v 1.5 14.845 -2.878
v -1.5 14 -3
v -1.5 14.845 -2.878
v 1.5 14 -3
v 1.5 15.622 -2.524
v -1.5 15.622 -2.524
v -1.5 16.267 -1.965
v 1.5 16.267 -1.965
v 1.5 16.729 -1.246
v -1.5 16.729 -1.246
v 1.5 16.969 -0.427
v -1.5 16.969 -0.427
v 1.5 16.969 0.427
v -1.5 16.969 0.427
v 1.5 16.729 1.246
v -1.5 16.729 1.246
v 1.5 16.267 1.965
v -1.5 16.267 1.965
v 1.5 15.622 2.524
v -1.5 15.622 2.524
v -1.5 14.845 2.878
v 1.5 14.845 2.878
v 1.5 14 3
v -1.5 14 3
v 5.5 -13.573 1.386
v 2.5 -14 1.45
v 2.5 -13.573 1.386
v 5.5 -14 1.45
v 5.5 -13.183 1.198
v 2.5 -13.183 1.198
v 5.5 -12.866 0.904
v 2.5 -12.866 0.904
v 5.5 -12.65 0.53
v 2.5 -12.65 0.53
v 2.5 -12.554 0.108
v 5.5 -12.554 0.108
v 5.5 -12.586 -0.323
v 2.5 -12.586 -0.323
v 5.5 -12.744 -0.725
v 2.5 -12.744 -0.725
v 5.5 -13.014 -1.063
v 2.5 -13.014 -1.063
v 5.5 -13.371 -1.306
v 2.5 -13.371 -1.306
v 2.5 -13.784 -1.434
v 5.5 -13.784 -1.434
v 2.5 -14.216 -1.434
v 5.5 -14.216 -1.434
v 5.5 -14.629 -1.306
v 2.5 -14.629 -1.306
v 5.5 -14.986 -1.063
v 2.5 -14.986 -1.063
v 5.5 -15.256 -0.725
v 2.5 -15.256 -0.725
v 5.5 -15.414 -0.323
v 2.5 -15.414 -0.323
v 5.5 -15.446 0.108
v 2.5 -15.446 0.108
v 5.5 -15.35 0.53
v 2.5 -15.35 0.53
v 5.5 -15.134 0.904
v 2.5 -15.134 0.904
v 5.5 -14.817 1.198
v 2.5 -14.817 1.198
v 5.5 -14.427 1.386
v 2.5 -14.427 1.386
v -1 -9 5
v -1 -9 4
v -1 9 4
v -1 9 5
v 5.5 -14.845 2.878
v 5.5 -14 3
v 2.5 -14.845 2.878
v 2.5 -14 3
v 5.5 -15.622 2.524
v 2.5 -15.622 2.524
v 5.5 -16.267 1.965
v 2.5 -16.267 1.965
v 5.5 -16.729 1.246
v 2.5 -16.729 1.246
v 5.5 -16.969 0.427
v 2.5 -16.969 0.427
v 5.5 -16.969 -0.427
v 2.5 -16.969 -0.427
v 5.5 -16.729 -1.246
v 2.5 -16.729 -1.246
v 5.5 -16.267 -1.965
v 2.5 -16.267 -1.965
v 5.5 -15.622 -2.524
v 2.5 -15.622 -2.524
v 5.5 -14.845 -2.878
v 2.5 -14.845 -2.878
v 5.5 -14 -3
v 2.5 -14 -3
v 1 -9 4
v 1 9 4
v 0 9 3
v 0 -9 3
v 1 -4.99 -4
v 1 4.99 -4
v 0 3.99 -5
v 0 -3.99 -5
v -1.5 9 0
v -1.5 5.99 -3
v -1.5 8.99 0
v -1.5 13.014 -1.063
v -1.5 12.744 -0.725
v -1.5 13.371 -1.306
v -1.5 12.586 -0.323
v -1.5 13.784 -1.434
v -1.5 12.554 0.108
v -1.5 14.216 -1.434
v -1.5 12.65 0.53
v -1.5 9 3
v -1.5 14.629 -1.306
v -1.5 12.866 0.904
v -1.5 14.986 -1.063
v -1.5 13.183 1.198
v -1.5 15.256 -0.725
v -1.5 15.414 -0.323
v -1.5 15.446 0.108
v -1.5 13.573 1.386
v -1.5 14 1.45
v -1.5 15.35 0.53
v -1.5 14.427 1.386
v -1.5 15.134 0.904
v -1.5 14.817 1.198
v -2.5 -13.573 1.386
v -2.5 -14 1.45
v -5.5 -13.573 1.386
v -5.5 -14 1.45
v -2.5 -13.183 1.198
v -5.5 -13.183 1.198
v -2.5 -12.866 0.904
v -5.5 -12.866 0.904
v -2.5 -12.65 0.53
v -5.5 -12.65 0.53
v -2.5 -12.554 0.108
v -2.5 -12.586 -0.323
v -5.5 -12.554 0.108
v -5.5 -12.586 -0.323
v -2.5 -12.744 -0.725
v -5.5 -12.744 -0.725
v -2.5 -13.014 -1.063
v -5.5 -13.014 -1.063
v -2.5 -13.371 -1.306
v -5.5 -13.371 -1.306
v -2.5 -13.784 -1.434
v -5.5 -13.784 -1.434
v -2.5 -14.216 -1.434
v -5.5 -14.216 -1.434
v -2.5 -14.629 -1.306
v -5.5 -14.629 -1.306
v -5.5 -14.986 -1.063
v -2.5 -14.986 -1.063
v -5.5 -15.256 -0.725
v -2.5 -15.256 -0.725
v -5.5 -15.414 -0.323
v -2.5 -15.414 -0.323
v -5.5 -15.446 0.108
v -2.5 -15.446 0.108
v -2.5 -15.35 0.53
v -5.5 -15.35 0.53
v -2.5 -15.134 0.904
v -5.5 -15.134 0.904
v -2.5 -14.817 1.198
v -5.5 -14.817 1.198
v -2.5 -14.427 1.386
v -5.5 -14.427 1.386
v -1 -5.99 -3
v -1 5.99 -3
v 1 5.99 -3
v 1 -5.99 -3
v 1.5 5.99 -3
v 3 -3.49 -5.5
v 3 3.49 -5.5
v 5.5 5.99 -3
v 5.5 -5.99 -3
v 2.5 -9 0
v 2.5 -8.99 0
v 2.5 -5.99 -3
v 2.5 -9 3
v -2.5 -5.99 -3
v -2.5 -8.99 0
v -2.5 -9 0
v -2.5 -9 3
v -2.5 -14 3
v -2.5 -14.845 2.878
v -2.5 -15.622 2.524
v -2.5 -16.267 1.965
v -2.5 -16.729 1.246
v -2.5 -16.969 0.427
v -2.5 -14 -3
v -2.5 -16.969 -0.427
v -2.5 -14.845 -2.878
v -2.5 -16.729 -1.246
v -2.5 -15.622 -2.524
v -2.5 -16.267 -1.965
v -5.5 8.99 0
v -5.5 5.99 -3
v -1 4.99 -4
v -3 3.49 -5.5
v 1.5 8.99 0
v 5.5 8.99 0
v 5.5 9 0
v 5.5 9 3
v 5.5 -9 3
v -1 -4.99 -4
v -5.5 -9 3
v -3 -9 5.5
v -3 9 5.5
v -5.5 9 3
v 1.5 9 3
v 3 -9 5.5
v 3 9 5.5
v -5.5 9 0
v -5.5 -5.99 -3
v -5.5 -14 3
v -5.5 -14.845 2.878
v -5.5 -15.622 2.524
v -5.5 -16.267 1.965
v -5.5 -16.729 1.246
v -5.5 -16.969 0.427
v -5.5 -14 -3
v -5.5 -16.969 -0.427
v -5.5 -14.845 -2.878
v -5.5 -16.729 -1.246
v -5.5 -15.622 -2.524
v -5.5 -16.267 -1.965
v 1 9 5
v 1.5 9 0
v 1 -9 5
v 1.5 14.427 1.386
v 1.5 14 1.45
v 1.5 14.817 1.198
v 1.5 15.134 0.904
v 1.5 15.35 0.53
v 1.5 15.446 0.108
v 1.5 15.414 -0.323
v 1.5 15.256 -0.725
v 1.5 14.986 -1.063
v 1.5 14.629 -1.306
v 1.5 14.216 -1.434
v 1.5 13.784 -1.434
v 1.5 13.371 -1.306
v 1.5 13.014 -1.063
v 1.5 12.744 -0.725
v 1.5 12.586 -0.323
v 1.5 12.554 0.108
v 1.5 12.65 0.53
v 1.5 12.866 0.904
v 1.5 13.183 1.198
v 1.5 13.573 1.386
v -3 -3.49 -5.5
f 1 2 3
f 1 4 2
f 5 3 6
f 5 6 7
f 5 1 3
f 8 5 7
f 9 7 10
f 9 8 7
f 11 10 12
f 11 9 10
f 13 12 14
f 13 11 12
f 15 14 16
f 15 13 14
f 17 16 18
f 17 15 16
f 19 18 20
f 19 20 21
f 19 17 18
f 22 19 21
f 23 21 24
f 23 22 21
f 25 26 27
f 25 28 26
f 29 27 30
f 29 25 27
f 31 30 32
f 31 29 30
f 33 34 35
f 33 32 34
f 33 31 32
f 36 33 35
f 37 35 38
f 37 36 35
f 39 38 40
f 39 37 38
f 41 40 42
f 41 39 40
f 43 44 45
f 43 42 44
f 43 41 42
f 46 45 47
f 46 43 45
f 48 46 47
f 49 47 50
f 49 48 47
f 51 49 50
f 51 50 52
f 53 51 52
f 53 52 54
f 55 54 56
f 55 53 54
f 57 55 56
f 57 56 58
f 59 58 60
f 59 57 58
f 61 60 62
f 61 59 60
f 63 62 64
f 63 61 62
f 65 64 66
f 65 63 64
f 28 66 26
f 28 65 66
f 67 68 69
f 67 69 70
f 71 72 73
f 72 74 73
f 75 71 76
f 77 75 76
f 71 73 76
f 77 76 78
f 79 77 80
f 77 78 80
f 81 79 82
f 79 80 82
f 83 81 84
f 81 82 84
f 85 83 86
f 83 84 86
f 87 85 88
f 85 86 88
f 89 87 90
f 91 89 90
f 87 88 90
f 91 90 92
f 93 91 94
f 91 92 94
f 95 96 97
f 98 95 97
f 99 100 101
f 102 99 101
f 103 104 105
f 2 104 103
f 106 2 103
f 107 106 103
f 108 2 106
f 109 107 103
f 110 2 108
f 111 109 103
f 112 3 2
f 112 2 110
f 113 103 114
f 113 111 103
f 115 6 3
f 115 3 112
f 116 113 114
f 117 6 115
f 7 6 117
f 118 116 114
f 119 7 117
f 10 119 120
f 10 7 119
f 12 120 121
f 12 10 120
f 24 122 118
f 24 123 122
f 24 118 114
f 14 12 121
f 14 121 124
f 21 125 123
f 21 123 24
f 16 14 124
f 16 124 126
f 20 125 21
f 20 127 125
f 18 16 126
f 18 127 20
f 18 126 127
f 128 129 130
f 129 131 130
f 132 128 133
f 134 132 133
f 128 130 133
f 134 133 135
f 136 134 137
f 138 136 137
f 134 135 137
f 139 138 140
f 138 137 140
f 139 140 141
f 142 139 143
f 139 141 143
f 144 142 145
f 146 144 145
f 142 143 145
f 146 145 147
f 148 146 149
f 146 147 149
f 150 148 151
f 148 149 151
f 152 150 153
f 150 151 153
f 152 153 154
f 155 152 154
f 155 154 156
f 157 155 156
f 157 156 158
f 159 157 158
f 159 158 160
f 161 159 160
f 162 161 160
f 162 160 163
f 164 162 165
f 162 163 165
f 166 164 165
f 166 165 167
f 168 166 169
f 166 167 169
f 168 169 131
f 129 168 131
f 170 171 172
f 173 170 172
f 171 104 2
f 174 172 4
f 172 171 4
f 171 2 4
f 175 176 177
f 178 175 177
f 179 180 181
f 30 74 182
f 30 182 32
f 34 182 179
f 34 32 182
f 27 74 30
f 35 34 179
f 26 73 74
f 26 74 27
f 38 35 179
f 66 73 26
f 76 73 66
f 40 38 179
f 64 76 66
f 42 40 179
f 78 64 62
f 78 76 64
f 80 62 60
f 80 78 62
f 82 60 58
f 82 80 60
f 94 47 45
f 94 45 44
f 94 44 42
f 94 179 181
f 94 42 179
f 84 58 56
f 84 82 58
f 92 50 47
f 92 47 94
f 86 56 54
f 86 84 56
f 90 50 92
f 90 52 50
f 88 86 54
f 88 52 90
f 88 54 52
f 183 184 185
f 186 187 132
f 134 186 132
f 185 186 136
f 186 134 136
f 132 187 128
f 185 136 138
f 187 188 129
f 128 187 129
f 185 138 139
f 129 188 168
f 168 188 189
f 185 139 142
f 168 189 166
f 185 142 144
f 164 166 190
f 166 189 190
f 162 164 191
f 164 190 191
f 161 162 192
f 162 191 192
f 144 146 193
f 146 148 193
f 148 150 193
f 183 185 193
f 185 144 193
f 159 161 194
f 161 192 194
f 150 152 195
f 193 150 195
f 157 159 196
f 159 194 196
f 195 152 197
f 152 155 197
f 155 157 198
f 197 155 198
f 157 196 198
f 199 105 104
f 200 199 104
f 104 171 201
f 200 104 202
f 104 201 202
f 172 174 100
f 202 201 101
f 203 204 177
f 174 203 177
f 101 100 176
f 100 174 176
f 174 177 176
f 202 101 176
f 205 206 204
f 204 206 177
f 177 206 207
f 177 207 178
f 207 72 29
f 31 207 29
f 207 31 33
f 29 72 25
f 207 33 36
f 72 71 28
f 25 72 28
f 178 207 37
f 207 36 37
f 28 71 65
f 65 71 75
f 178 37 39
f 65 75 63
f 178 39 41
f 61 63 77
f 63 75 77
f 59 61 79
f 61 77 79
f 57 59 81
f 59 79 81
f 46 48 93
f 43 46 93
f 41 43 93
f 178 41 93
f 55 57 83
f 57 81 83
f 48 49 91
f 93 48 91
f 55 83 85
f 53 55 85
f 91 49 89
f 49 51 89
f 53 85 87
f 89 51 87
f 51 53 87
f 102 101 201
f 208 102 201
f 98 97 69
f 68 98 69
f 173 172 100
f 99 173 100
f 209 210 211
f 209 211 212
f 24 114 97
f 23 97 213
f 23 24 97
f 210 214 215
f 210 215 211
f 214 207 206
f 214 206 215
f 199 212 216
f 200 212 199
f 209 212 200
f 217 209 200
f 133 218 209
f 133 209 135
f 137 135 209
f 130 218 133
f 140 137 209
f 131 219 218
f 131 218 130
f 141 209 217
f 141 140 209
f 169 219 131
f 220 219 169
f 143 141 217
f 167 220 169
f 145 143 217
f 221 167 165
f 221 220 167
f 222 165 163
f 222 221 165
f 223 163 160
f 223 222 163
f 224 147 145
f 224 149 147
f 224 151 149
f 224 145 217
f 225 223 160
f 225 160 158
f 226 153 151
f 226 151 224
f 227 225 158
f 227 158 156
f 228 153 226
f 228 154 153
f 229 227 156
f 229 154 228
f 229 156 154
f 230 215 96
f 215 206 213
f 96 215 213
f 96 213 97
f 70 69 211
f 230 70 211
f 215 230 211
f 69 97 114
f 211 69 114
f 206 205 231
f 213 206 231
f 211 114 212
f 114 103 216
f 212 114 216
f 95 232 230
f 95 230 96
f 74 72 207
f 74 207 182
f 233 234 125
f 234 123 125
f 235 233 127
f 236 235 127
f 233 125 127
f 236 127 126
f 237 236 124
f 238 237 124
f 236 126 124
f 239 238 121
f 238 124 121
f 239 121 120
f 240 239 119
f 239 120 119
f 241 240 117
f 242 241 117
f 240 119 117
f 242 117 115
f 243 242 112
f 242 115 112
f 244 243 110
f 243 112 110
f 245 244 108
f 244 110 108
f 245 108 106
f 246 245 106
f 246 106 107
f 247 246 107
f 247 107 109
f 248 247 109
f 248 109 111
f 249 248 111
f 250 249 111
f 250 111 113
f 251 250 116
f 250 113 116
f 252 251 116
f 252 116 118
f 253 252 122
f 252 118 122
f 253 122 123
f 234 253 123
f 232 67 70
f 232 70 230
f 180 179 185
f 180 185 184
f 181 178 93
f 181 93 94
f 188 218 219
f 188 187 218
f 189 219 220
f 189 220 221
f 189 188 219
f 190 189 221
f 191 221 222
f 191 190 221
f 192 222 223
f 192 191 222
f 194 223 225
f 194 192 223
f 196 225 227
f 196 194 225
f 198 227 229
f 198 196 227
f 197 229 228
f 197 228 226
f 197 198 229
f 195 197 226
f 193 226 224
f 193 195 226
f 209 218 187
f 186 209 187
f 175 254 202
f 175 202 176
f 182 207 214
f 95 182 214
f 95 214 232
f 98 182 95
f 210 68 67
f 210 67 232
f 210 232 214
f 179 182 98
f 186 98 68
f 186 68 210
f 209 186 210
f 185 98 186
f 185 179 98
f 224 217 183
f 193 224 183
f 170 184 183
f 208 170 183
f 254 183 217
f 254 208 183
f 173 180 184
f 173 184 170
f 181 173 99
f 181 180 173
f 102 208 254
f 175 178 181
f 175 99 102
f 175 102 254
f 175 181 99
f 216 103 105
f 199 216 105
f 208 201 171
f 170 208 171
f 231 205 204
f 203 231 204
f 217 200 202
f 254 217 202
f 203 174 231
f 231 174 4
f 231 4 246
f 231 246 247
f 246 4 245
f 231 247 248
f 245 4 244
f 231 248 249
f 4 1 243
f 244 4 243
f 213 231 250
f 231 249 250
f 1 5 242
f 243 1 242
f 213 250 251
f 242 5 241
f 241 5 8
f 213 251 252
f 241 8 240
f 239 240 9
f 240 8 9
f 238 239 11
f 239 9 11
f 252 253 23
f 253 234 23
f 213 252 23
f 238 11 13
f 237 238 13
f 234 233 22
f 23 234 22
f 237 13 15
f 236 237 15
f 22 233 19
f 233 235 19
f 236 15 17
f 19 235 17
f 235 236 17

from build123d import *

# Parameters (mm, degrees)
BOSS_EXTRUDE1_DEPTH     = 9
CUT_EXTRUDE2_DEPTH      = 12.895377253
SKETCH6_W               = 3
SKETCH6_H               = 6
BOSS_EXTRUDE3_DEPTH     = 5
SKETCH7_W               = 3
SKETCH7_H               = 3
REVOLVE1_ANGLE          = 180
SKETCH9_R               = 1.45
CUT_EXTRUDE3_DEPTH      = 5
SKETCH10_W              = 3
SKETCH10_H              = 6
BOSS_EXTRUDE4_DEPTH     = 5
SKETCH12_W              = 3
SKETCH12_H              = 3
REVOLVE2_ANGLE          = 180
SKETCH14_R              = 1.45
CUT_EXTRUDE4_DEPTH      = 5
CUT_EXTRUDE5_DEPTH      = 19.694919096
CUT_EXTRUDE5_DEPTH_BACK = 19.694919096


with BuildPart() as part:
    # Sketch2 → Boss-Extrude1 (new, symmetric)
    with BuildSketch(Plane(origin=(0, 0, 0), x_dir=(1, 0, 0), z_dir=(0, 1, 0))):
        Polygon((-3, 5.5), (3, 5.5), (5.5, 3), (5.5, -3), (3, -5.5), (-3, -5.5), (-5.5, -3), (-5.5, 3), align=None)
    extrude(amount=BOSS_EXTRUDE1_DEPTH, both=True)

    # Sketch5 → Cut-Extrude2 (cut, symmetric)
    with BuildSketch(Plane(origin=(0, 0, 0), x_dir=(0, 0, -1), z_dir=(1, 0, 0))):
        Polygon((0, 9), (0, 8.99), (5.5, 3.49), (5.5, 9), align=None)
    cut_extrude2 = extrude(amount=CUT_EXTRUDE2_DEPTH, both=True, mode=Mode.SUBTRACT)

    # Mirror3: Cut-Extrude2 across plane
    add(cut_extrude2.mirror(Plane.ZX), mode=Mode.SUBTRACT)

    # Sketch6 → Boss-Extrude3 (add, symmetric)
    with BuildSketch(Plane.XZ.offset(9)):
        with Locations((-4, 0)):
            Rectangle(SKETCH6_W, SKETCH6_H)
    boss_extrude3 = extrude(amount=BOSS_EXTRUDE3_DEPTH, both=True)

    # Sketch7 → Revolve1 (revolve)
    with BuildSketch(Plane.XZ.offset(14)):
        with Locations((-4, 1.5)):
            Rectangle(SKETCH7_W, SKETCH7_H)
    revolve1 = revolve(axis=Axis((-5.5, -14, 0), (1, 0, 0)), revolution_arc=REVOLVE1_ANGLE)

    # Sketch9 → Cut-Extrude3 (cut, symmetric)
    with BuildSketch(Plane.ZY.offset(5.5)):
        with Locations((0, -14)):
            Circle(SKETCH9_R)
    cut_extrude3 = extrude(amount=CUT_EXTRUDE3_DEPTH, both=True, mode=Mode.SUBTRACT)

    # Mirror5: Boss-Extrude3, Revolve1, Cut-Extrude3 across plane
    add(boss_extrude3.mirror(Plane(origin=(0, 0, 0), x_dir=(0, 0, 1), z_dir=(1, 0, 0))))
    add(revolve1.mirror(Plane(origin=(0, 0, 0), x_dir=(0, 0, 1), z_dir=(1, 0, 0))))
    add(cut_extrude3.mirror(Plane(origin=(0, 0, 0), x_dir=(0, 0, 1), z_dir=(1, 0, 0))), mode=Mode.SUBTRACT)

    # Sketch10 → Boss-Extrude4 (add, symmetric)
    with BuildSketch(Plane(origin=(0, 9, 0), x_dir=(1, 0, 0), z_dir=(0, 1, 0))):
        Rectangle(SKETCH10_W, SKETCH10_H)
    extrude(amount=BOSS_EXTRUDE4_DEPTH, both=True)

    # Sketch12 → Revolve2 (revolve)
    with BuildSketch(Plane(origin=(0, 14, 0), x_dir=(1, 0, 0), z_dir=(0, 1, 0))):
        with Locations((0, 1.5)):
            Rectangle(SKETCH12_W, SKETCH12_H)
    revolve(axis=Axis((-1.5, 14, 0), (1, 0, 0)), revolution_arc=REVOLVE2_ANGLE)

    # Sketch14 → Cut-Extrude4 (cut, symmetric)
    with BuildSketch(Plane.ZY.offset(1.5)):
        with Locations((0, 14)):
            Circle(SKETCH14_R)
    extrude(amount=CUT_EXTRUDE4_DEPTH, both=True, mode=Mode.SUBTRACT)

    # Sketch15 → Cut-Extrude5 (cut, two sides: drawn at the far end of the back side and taken through both)
    with BuildSketch(Plane(origin=(0, 0, 0), x_dir=(1, 0, 0), z_dir=(0, 1, 0)).offset(-CUT_EXTRUDE5_DEPTH_BACK)):
        Polygon((0, 5), (-1, 4), (-1, 3), (1, 3), (1, 4), align=None)
        Polygon((1, -4), (0, -3), (-1, -4), (-1, -5), (1, -5), align=None)
    extrude(amount=CUT_EXTRUDE5_DEPTH + CUT_EXTRUDE5_DEPTH_BACK, mode=Mode.SUBTRACT)


solid = part.part
